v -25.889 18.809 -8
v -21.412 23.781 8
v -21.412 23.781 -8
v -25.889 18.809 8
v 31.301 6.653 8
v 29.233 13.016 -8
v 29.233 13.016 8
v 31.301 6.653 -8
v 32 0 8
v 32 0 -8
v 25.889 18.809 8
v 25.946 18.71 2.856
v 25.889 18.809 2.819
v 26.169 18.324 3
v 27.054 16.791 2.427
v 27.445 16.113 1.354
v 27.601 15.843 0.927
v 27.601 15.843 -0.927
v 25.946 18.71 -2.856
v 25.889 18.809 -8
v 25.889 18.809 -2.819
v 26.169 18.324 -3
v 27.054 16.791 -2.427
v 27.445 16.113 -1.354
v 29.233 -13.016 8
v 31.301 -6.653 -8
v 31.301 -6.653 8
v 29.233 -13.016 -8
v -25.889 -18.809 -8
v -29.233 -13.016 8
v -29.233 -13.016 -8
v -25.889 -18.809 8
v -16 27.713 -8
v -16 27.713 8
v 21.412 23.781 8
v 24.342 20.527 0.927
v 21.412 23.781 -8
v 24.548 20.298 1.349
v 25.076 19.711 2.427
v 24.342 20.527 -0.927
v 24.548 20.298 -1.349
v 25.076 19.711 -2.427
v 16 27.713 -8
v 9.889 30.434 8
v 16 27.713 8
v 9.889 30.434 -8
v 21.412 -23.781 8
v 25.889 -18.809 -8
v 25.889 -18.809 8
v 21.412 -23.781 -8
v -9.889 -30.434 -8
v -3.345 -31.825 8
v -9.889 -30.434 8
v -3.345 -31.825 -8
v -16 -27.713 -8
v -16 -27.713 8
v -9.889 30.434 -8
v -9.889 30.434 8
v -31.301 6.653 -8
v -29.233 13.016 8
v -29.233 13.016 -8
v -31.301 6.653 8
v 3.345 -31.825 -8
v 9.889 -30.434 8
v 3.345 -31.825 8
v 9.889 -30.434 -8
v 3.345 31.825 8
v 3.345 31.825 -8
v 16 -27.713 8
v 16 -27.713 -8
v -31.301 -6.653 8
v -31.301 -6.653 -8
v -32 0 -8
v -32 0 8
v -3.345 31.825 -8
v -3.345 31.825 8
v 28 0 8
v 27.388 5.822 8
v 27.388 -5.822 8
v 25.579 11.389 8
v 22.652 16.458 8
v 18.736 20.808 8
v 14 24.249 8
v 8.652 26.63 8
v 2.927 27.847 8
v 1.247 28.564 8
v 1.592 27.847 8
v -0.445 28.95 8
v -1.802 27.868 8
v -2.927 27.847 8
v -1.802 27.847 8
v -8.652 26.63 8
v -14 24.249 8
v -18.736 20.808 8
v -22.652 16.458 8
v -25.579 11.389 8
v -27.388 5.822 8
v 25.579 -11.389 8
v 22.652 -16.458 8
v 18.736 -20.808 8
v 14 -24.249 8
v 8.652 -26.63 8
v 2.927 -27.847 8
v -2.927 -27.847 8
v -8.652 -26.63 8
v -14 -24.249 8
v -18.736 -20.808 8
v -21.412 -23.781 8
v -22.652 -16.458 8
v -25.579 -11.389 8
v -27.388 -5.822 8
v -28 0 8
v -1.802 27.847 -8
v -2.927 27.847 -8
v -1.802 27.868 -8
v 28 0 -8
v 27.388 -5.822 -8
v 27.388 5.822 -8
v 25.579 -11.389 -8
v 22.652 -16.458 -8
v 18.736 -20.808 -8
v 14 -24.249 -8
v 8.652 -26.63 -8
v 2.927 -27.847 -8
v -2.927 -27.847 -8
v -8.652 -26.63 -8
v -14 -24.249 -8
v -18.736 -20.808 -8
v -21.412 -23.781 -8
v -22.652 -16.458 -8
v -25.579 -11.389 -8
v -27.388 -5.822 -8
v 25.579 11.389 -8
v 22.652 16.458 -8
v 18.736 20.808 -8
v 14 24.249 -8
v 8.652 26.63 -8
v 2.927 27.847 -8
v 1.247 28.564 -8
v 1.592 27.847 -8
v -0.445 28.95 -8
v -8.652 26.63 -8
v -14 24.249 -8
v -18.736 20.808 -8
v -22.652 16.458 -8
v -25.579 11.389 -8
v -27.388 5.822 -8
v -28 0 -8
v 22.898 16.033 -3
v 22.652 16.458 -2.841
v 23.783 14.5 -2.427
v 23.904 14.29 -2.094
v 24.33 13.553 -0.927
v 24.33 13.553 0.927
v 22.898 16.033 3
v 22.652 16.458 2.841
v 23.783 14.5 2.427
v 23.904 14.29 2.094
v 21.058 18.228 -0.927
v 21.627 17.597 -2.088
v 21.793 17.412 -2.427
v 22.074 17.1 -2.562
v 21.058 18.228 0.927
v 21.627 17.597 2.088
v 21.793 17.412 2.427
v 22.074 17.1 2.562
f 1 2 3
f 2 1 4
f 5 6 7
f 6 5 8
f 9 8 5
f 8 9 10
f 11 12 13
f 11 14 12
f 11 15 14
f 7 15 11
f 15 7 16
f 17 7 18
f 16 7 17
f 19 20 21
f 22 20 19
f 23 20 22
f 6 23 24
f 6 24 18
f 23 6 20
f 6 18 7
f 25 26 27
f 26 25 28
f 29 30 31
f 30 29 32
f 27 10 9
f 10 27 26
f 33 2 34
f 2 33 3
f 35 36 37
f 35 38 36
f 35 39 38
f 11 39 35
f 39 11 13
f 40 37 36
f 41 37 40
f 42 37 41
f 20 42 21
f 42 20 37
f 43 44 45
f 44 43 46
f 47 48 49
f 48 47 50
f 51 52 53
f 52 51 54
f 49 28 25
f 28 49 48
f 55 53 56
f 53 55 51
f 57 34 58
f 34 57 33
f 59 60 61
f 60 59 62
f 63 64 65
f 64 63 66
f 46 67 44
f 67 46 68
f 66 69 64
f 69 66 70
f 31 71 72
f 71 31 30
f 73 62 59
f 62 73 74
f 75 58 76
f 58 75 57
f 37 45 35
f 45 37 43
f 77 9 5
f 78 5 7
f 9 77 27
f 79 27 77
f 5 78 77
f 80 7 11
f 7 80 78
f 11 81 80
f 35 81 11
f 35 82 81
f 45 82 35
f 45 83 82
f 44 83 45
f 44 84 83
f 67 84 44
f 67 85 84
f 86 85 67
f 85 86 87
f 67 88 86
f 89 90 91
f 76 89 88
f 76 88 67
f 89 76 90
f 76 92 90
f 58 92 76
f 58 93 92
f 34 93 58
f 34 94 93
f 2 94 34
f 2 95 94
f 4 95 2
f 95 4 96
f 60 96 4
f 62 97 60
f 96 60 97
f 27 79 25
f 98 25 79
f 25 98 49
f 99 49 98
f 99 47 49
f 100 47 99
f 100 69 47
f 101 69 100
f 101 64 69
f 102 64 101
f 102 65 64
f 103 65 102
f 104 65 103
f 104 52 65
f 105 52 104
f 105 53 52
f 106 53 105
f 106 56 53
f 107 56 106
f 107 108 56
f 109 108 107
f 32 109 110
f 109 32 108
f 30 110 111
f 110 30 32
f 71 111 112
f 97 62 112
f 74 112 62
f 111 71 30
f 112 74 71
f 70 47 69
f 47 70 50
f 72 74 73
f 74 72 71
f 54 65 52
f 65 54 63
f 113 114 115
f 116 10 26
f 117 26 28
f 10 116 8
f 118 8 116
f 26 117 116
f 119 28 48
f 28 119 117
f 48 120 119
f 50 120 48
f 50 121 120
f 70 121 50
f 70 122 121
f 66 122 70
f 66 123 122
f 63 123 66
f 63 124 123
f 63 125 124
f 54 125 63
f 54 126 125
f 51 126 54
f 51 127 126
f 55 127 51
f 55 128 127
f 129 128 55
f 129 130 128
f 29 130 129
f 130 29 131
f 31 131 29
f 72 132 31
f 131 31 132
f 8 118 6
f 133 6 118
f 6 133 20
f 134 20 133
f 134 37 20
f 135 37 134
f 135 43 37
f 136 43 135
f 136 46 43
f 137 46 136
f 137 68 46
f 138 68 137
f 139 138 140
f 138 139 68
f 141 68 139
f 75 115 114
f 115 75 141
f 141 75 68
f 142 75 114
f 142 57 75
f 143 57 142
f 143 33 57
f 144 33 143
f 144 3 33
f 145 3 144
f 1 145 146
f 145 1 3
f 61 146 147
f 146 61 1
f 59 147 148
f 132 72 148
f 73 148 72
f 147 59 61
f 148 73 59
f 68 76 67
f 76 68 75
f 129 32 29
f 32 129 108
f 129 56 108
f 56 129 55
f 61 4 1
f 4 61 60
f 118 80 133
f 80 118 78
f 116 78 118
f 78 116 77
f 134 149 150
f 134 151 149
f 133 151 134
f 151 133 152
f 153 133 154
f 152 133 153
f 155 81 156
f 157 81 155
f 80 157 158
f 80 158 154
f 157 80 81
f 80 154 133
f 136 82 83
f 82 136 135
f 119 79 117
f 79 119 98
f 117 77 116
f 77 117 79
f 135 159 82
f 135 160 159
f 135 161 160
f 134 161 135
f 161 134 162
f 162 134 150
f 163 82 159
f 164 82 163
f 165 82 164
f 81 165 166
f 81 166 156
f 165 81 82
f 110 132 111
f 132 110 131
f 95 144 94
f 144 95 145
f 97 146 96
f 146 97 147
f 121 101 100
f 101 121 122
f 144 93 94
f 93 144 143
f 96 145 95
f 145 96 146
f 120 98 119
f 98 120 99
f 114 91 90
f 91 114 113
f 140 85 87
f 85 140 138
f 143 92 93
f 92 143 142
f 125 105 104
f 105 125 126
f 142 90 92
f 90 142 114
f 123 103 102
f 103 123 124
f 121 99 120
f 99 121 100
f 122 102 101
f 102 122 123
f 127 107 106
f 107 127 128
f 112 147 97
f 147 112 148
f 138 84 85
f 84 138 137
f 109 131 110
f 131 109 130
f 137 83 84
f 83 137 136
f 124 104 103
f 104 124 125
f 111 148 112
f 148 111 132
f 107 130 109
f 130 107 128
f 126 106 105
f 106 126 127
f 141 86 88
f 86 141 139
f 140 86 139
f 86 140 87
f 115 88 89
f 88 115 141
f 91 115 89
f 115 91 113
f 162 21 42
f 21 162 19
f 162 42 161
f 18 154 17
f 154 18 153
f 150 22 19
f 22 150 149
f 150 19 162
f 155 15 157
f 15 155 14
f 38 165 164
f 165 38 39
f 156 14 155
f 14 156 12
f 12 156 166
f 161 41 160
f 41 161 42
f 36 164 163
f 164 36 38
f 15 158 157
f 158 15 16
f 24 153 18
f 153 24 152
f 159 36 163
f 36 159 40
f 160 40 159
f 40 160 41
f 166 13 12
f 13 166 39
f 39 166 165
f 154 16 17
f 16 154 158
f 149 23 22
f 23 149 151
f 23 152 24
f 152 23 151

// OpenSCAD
hole_angle = 35;
difference(){
    difference(){
    	difference(){
    		cylinder(h=16,r=32,center=true);
    		cylinder(h=18,r=28,center=true);
    	}
    	translate([0,27,0]){
        	cylinder(h=18,r=2,center=true);
    	}
	}
	translate([30*cos(hole_angle),30*sin(hole_angle),0]){
    	rotate([0,90,hole_angle]){
   			cylinder(h=8,r=3,center=true);
   		}
	}
}
